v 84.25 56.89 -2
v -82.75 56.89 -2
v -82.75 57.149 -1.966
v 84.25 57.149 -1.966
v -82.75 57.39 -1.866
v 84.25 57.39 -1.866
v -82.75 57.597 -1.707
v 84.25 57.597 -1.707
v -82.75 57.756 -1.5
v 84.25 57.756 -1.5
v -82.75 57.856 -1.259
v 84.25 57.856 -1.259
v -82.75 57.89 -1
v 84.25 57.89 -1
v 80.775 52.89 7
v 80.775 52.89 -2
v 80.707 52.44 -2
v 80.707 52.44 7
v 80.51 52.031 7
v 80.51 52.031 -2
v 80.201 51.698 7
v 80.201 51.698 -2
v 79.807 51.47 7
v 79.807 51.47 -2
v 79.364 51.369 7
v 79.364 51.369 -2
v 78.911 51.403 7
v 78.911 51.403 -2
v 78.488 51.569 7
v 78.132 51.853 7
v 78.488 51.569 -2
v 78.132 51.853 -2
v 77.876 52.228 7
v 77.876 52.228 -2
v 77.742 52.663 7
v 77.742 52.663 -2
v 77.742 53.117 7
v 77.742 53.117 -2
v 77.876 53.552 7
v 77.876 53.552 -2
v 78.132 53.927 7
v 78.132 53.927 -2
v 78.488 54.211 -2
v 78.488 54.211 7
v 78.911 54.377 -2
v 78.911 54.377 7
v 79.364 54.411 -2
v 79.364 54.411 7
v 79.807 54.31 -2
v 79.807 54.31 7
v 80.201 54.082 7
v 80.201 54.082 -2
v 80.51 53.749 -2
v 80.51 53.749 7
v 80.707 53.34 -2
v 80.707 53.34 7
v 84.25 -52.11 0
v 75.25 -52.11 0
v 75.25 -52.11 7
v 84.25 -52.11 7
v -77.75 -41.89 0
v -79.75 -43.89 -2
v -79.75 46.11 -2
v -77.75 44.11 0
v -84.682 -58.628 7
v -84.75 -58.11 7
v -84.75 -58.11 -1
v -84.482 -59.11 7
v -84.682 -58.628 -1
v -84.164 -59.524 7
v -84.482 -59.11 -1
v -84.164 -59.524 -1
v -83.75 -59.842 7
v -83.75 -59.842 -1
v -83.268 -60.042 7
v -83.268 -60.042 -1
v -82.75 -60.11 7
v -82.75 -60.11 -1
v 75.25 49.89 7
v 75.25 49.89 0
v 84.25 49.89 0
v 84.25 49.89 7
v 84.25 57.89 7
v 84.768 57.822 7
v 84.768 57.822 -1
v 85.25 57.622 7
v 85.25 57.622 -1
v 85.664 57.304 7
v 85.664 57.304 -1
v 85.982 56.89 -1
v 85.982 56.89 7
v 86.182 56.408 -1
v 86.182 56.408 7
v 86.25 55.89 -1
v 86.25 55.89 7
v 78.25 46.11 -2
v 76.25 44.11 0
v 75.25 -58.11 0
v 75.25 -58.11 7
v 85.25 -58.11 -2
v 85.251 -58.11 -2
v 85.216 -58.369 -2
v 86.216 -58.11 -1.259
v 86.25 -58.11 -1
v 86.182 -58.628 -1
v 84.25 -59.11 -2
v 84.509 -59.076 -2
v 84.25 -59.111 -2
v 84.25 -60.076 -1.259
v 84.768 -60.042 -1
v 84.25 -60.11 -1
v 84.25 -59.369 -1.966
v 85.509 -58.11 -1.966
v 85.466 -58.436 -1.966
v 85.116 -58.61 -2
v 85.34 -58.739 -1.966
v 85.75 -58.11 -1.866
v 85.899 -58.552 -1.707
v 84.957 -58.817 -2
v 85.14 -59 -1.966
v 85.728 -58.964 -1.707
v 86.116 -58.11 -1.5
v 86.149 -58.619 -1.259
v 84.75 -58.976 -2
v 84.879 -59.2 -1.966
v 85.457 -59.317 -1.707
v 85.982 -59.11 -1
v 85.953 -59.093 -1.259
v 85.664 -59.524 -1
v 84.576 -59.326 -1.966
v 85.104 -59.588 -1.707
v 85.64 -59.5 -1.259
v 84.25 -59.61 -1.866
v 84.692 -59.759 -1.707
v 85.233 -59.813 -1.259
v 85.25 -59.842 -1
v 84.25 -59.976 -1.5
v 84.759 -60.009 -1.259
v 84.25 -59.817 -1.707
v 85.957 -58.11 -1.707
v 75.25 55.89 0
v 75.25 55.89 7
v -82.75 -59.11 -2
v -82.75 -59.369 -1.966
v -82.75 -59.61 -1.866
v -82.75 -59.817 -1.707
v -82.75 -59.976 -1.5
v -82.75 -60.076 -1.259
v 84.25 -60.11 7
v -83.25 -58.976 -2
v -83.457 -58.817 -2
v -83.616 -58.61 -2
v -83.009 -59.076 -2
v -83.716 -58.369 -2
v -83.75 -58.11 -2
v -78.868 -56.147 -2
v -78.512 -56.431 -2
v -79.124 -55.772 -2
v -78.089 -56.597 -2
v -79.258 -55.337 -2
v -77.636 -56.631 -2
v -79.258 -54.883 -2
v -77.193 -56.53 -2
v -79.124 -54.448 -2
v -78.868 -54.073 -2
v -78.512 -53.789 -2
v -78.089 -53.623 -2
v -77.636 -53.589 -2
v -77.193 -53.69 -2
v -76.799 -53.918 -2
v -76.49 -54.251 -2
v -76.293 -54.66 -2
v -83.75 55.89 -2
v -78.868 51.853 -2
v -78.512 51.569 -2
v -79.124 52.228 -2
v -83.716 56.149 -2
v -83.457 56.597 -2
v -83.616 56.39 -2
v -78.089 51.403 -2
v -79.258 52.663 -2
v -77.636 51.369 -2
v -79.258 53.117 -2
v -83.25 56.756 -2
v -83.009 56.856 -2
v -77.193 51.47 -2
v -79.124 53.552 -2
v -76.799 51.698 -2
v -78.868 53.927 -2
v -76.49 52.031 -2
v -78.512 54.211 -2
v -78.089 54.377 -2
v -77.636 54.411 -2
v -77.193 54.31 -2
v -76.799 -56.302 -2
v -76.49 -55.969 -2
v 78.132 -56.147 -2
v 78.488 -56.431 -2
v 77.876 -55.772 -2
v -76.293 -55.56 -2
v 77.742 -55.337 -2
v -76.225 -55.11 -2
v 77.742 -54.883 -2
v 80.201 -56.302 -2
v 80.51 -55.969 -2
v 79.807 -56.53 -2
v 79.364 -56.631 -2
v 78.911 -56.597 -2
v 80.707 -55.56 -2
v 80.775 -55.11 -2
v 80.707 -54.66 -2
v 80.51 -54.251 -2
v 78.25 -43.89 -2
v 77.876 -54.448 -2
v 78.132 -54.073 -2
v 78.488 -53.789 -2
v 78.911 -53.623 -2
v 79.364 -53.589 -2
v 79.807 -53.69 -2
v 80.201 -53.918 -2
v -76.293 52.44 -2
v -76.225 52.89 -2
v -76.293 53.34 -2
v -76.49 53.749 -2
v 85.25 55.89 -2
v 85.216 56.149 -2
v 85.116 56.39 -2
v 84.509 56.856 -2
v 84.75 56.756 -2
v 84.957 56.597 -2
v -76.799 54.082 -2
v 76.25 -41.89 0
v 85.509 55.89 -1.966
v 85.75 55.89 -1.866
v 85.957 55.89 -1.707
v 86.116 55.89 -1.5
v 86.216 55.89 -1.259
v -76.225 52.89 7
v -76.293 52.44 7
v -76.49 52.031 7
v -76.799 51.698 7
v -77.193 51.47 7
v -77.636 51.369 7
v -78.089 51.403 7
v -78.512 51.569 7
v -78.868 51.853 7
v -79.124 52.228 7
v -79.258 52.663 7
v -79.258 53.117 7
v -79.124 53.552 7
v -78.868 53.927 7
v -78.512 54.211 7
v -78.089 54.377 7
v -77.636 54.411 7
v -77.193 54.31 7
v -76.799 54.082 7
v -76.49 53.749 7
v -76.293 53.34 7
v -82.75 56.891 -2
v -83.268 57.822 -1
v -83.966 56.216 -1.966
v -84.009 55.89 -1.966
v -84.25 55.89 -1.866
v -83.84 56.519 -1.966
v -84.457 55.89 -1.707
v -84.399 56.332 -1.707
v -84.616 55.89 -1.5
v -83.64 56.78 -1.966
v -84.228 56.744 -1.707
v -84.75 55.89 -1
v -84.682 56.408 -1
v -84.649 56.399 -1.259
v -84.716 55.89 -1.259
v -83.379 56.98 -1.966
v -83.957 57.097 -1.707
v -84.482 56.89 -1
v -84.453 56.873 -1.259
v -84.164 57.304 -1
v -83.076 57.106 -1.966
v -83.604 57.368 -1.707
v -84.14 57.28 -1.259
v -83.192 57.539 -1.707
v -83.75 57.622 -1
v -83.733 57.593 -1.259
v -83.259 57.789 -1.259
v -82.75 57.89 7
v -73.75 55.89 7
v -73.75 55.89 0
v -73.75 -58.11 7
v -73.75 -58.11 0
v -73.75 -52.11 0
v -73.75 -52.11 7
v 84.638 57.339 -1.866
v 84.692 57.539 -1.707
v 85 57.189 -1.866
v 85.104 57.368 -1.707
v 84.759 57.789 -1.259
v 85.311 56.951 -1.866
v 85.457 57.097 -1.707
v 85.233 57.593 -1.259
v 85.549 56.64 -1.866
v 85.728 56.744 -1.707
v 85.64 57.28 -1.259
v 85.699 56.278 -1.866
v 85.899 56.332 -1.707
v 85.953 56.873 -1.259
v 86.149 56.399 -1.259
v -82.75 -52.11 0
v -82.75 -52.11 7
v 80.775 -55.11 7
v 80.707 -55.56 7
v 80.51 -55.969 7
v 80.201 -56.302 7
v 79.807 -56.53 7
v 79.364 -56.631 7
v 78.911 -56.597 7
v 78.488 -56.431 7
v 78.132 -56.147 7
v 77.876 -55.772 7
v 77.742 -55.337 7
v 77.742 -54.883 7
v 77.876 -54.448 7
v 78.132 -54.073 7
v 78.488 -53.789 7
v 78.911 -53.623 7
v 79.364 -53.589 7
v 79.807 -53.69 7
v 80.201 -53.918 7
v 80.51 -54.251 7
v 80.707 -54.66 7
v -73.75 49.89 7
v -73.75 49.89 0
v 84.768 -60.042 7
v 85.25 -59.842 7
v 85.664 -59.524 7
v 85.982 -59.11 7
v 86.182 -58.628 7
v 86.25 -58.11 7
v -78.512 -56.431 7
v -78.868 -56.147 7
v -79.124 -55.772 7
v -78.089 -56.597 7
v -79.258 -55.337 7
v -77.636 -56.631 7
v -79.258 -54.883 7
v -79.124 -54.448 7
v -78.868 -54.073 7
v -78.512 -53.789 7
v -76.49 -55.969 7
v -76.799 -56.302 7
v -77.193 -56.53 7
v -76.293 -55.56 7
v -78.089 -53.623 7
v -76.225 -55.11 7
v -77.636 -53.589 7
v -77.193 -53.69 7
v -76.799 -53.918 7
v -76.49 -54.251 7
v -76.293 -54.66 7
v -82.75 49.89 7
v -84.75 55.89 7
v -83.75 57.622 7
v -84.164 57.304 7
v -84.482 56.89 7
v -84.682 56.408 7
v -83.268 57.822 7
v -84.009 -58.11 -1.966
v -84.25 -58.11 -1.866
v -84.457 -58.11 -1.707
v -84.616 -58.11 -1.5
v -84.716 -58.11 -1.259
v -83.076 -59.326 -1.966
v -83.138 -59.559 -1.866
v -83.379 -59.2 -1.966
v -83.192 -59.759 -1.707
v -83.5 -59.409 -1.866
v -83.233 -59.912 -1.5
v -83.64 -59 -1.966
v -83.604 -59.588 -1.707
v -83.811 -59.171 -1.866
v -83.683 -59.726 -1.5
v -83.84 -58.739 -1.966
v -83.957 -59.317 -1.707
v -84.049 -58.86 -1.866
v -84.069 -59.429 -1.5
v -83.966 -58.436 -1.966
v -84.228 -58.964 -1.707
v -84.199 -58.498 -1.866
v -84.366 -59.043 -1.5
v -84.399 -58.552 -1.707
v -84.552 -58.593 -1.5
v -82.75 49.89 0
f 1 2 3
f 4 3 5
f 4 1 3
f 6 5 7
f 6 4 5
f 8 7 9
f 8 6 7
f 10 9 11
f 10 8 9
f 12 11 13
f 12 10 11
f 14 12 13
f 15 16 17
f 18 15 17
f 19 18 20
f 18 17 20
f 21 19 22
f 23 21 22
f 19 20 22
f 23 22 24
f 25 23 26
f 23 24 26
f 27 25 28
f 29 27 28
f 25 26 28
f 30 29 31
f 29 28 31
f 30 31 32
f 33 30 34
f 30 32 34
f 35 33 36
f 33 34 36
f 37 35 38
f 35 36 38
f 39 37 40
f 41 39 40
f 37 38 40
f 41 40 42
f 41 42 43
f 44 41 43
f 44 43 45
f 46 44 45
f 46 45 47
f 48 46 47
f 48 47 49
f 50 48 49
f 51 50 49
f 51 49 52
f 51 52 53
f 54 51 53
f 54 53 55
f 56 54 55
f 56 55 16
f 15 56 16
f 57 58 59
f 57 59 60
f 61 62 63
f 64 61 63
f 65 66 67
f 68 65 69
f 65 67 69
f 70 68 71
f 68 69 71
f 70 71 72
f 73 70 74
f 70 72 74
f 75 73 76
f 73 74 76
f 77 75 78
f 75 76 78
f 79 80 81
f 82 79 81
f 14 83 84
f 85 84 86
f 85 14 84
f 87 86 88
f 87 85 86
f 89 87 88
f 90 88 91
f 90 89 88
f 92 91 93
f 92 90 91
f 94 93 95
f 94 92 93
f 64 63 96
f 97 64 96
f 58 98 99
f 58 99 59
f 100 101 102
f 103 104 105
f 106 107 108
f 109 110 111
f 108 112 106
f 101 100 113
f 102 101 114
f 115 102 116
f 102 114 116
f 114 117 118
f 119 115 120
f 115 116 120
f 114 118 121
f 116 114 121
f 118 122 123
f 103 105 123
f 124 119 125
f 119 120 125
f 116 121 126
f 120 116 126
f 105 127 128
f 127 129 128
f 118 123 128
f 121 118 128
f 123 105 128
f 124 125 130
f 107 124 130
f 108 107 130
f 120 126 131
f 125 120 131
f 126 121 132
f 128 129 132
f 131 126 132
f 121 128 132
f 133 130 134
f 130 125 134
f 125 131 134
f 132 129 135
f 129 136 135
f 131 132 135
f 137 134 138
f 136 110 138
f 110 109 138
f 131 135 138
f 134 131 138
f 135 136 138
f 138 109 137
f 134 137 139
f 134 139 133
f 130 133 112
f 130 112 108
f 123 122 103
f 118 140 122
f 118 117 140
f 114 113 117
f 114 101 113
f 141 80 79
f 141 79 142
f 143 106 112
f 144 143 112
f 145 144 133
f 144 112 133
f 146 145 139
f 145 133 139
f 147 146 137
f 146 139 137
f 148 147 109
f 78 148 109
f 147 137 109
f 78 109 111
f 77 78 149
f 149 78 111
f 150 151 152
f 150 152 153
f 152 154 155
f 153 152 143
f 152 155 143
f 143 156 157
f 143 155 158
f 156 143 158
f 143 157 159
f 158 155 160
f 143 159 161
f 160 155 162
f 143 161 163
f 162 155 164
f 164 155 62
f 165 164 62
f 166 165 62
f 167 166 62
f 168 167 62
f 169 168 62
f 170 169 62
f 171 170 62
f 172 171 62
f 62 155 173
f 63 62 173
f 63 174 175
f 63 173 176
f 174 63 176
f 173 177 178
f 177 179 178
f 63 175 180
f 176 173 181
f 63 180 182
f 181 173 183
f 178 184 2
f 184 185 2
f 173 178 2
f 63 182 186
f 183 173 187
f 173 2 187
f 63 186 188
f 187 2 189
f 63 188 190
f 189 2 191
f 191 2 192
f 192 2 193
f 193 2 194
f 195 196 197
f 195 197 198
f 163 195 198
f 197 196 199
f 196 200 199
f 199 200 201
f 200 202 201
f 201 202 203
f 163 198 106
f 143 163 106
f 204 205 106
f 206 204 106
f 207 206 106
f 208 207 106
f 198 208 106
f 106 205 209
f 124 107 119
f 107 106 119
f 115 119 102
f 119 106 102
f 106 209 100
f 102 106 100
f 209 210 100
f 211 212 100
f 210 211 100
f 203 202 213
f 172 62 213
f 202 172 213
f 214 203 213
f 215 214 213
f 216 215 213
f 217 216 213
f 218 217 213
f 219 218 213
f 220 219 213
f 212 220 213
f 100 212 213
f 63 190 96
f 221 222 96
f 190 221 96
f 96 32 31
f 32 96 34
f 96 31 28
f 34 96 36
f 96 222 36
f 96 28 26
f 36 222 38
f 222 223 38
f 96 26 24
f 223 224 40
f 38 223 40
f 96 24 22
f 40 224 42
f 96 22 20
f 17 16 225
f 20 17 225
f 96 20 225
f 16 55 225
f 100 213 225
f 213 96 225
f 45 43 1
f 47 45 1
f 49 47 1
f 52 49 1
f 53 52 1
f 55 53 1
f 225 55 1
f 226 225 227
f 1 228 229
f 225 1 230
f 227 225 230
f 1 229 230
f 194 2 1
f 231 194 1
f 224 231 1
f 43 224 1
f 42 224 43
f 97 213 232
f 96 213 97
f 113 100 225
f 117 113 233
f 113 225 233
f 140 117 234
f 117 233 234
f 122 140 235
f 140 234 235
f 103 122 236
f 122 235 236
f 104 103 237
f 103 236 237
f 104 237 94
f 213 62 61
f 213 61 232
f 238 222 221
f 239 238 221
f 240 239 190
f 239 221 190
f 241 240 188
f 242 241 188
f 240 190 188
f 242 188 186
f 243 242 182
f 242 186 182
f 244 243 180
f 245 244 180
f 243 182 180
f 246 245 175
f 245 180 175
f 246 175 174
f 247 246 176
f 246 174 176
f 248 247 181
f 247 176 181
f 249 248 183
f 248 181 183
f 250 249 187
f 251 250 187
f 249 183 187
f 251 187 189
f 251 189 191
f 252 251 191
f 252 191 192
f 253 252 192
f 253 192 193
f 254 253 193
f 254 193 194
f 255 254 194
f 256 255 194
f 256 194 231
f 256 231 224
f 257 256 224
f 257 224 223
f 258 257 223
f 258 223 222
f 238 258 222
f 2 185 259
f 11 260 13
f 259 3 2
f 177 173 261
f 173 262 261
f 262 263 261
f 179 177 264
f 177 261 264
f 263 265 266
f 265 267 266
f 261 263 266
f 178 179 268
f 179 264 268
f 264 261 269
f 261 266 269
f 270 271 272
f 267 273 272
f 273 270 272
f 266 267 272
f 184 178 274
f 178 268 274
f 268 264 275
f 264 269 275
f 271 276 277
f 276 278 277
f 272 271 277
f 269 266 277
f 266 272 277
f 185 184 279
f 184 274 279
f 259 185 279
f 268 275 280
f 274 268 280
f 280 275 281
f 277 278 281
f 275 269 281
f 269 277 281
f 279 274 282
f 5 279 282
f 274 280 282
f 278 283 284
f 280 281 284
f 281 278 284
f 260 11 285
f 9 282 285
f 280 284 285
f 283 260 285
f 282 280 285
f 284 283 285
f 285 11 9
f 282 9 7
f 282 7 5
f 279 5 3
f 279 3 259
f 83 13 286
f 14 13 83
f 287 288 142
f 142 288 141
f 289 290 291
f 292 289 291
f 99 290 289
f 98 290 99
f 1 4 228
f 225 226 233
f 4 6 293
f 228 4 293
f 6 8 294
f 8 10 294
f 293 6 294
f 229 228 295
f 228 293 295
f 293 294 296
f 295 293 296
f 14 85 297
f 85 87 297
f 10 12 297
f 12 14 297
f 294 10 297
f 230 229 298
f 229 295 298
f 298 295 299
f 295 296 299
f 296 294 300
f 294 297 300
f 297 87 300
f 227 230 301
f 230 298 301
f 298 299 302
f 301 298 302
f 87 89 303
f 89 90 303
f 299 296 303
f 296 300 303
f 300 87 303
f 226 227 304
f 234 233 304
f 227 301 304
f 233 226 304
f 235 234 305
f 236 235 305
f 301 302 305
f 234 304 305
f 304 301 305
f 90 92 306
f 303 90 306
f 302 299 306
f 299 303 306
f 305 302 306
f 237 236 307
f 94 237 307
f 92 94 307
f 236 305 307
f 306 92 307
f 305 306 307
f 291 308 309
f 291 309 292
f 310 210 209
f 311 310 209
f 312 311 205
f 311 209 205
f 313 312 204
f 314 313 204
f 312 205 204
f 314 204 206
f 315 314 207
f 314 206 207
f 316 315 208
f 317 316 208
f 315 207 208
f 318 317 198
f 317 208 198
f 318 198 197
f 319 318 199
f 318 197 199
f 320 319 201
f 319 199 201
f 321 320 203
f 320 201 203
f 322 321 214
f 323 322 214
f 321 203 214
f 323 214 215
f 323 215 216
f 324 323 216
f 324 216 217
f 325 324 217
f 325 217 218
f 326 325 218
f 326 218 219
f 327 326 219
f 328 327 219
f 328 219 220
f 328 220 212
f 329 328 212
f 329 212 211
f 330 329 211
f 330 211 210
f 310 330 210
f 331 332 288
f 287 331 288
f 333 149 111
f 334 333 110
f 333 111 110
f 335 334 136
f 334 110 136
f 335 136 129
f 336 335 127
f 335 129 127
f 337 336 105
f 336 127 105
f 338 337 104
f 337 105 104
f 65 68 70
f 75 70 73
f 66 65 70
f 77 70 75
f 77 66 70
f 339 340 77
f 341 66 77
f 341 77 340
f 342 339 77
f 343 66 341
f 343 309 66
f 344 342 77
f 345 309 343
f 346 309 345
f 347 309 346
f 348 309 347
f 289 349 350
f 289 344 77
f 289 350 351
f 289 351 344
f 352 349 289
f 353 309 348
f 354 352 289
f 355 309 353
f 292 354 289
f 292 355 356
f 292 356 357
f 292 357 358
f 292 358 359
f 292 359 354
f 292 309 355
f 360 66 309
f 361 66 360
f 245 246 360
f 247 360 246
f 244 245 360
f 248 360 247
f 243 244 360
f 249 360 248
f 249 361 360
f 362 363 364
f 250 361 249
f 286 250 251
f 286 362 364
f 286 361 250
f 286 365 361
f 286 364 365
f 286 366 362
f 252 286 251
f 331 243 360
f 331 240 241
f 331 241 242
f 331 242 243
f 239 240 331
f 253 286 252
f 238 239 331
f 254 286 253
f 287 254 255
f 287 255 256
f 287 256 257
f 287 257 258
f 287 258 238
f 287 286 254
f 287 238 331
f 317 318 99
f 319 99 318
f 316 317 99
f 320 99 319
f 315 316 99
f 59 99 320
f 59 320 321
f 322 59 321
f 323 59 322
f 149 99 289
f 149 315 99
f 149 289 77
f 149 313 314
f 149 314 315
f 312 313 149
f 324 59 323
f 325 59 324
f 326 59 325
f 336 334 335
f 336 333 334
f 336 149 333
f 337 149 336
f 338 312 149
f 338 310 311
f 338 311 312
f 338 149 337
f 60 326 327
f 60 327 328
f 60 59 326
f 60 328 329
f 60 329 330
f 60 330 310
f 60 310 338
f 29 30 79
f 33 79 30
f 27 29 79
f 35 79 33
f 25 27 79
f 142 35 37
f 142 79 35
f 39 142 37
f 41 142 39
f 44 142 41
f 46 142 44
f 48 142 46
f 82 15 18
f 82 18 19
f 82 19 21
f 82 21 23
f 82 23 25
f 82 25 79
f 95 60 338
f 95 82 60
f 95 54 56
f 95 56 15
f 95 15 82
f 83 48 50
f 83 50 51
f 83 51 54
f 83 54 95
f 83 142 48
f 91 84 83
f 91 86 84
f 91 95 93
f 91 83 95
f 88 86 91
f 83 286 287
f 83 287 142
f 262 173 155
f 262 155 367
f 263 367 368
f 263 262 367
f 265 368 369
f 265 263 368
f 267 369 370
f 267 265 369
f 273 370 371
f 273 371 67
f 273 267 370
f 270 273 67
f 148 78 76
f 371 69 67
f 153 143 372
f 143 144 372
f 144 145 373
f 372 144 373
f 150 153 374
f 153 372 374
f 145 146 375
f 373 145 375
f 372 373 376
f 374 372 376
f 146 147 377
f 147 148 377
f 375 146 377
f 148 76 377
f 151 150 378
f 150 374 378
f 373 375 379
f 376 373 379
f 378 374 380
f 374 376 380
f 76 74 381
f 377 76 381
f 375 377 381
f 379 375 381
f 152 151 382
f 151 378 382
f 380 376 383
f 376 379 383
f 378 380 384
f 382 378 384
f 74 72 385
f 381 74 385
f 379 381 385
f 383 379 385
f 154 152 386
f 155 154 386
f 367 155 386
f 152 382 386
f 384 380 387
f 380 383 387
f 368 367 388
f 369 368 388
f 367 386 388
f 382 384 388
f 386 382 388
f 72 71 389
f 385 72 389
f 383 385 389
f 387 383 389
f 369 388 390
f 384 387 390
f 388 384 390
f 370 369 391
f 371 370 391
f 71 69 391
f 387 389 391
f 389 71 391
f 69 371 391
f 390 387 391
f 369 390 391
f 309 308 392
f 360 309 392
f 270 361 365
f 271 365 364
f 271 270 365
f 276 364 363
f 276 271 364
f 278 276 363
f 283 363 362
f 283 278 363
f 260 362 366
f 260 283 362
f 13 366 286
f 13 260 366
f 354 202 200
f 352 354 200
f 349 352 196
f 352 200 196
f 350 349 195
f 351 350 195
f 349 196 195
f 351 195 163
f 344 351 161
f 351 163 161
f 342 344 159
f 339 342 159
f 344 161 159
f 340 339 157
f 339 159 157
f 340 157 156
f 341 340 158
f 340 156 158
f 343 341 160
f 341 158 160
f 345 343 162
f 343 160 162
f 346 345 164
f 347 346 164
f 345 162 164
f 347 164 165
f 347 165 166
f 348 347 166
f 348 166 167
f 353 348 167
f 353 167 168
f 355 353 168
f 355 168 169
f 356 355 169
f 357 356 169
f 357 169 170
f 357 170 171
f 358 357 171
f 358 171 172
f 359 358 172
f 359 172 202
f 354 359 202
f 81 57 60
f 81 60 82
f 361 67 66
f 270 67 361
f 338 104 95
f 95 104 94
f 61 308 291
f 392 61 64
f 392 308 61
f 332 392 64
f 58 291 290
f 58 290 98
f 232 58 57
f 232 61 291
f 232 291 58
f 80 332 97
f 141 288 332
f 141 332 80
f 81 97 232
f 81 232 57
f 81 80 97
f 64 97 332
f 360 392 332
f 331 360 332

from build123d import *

# Parameters (mm, degrees)
F0_W          = 171
F0_H          = 118
F0_W_2        = 154
F0_H_2        = 86
F1_DEPTH      = 2
F2_SIZE       = 1.99999
F3_R          = 1
F4_W          = 171
F4_H          = 118
F4_W_2        = 167
F4_H_2        = 114
F5_DEPTH      = 7
F6_W          = 9
F6_H          = 6
F7_DEPTH      = 7
F8_R          = 1.525
F9_DEPTH      = 9.001
F10_T1_DEPTH  = 14
F10_T4_ANGLE  = 90
F10_T6_ANGLE  = 90
F10_T8_ANGLE  = 90
F10_T10_ANGLE = 90


# Not quite as in the source:
# - a fillet or chamfer that OpenCascade refuses, or shapes differently, is made with other operations: its cross-section is extruded or revolved along the edge and cut away or added
# - a fillet or chamfer is up to 0.001 mm smaller than in the source, because OpenCascade refuses the exact size


with BuildPart() as f1:
    # F0 (on Top) → F1 (new body)
    with BuildSketch(Plane.XY):
        with Locations((0.75, -1.11)):
            Rectangle(F0_W, F0_H)
        with Locations((-0.75, 1.11)):
            Rectangle(F0_W_2, F0_H_2, mode=Mode.SUBTRACT)
    extrude(amount=-F1_DEPTH)

    # F2 (size 2 in the source; OpenCascade refuses exactly that, so slightly less here)
    f2_edges = [f1.edges().sort_by_distance(p)[0] for p in [
        (76.25, 1.11, -2),
        (-0.75, -41.89, -2),
        (-0.75, 44.11, -2),
        (-77.75, 1.11, -2),
    ]]
    chamfer(f2_edges, length=F2_SIZE)

    # F3
    f3_edges = [f1.edges().sort_by_distance(p)[0] for p in [
        (-84.75, -1.11, -2),
        (0.75, -60.11, -2),
        (86.25, -1.11, -2),
        (0.75, 57.89, -2),
    ]]
    fillet(f3_edges, radius=F3_R)

    # F4 (on face) → F5 (join)
    with BuildSketch(Plane.XY):
        with Locations((0.75, -1.11)):
            Rectangle(F4_W, F4_H)
        with Locations((0.75, -1.11)):
            Rectangle(F4_W_2, F4_H_2, mode=Mode.SUBTRACT)
    extrude(amount=F5_DEPTH)

    # F6 (on face) → F7 (join)
    with BuildSketch(Plane.XY):
        with Locations((-78.25, 52.89)):
            Rectangle(F6_W, F6_H)
        with Locations((79.75, 52.89)):
            Rectangle(F6_W, F6_H)
        with Locations((79.75, -55.11)):
            Rectangle(F6_W, F6_H)
        with Locations((-78.25, -55.11)):
            Rectangle(F6_W, F6_H)
    extrude(amount=F7_DEPTH)

    # F8 (on face) → F9 (cut, through all)
    with BuildSketch(Plane(origin=(0, 0, -2), x_dir=(1, 0, 0), z_dir=(0, 0, -1))):
        with Locations((-77.75, 55.11)):
            Circle(F8_R)
        with Locations((79.25, 55.11)):
            Circle(F8_R)
        with Locations((-77.75, -52.89)):
            Circle(F8_R)
        with Locations((79.25, -52.89)):
            Circle(F8_R)
    extrude(amount=-F9_DEPTH, mode=Mode.SUBTRACT)

    # F10: fillet of radius 2 on 4 edges, made by hand

    # F10_s2 → F10_t1 (cut)
    with BuildSketch(Plane.XY.offset(-2)):
        with BuildLine():
            ThreePointArc((-84.75, 55.89), (-84.1642135624, 57.3042135624), (-82.75, 57.89))
            Line((-82.75, 57.89), (-84.75, 57.89))
            Line((-84.75, 57.89), (-84.75, 55.89))
        make_face()
        with BuildLine():
            ThreePointArc((84.25, 57.89), (85.6642135624, 57.3042135624), (86.25, 55.89))
            Line((86.25, 55.89), (86.25, 57.89))
            Line((86.25, 57.89), (84.25, 57.89))
        make_face()
        with BuildLine():
            ThreePointArc((84.25, -60.11), (85.6642135624, -59.5242135624), (86.25, -58.11))
            Line((86.25, -58.11), (86.25, -60.11))
            Line((86.25, -60.11), (84.25, -60.11))
        make_face()
        with BuildLine():
            ThreePointArc((-84.75, -58.11), (-84.1642135624, -59.5242135624), (-82.75, -60.11))
            Line((-82.75, -60.11), (-84.75, -60.11))
            Line((-84.75, -60.11), (-84.75, -58.11))
        make_face()
    extrude(amount=F10_T1_DEPTH, mode=Mode.SUBTRACT)

    # F10_s3 → F10_t4 (revolve, cut)
    with BuildSketch(Plane.YZ.offset(-82.75)):
        with BuildLine():
            ThreePointArc((-59.11, -2), (-59.8171067812, -1.7071067812), (-60.11, -1))
            Line((-60.11, -1), (-60.11, -2))
            Line((-60.11, -2), (-59.11, -2))
        make_face()
    revolve(axis=Axis((-82.75, -58.11, -2), (0, 0, -1)), revolution_arc=F10_T4_ANGLE, mode=Mode.SUBTRACT)

    # F10_s5 → F10_t6 (revolve, cut)
    with BuildSketch(Plane.XZ.offset(58.11)):
        with BuildLine():
            ThreePointArc((85.25, -2), (85.9571067812, -1.7071067812), (86.25, -1))
            Line((86.25, -1), (86.25, -2))
            Line((86.25, -2), (85.25, -2))
        make_face()
    revolve(axis=Axis((84.25, -58.11, -2), (0, 0, -1)), revolution_arc=F10_T6_ANGLE, mode=Mode.SUBTRACT)

    # F10_s7 → F10_t8 (revolve, cut)
    with BuildSketch(Plane.YZ.offset(84.25)):
        with BuildLine():
            ThreePointArc((56.89, -2), (57.5971067812, -1.7071067812), (57.89, -1))
            Line((57.89, -1), (57.89, -2))
            Line((57.89, -2), (56.89, -2))
        make_face()
    revolve(axis=Axis((84.25, 55.89, -2), (0, 0, -1)), revolution_arc=F10_T8_ANGLE, mode=Mode.SUBTRACT)

    # F10_s9 → F10_t10 (revolve, cut)
    with BuildSketch(Plane.XZ.offset(-55.89)):
        with BuildLine():
            ThreePointArc((-83.75, -2), (-84.4571067812, -1.7071067812), (-84.75, -1))
            Line((-84.75, -1), (-84.75, -2))
            Line((-84.75, -2), (-83.75, -2))
        make_face()
    revolve(axis=Axis((-82.75, 55.89, -2), (0, 0, -1)), revolution_arc=F10_T10_ANGLE, mode=Mode.SUBTRACT)


solid = f1.part
